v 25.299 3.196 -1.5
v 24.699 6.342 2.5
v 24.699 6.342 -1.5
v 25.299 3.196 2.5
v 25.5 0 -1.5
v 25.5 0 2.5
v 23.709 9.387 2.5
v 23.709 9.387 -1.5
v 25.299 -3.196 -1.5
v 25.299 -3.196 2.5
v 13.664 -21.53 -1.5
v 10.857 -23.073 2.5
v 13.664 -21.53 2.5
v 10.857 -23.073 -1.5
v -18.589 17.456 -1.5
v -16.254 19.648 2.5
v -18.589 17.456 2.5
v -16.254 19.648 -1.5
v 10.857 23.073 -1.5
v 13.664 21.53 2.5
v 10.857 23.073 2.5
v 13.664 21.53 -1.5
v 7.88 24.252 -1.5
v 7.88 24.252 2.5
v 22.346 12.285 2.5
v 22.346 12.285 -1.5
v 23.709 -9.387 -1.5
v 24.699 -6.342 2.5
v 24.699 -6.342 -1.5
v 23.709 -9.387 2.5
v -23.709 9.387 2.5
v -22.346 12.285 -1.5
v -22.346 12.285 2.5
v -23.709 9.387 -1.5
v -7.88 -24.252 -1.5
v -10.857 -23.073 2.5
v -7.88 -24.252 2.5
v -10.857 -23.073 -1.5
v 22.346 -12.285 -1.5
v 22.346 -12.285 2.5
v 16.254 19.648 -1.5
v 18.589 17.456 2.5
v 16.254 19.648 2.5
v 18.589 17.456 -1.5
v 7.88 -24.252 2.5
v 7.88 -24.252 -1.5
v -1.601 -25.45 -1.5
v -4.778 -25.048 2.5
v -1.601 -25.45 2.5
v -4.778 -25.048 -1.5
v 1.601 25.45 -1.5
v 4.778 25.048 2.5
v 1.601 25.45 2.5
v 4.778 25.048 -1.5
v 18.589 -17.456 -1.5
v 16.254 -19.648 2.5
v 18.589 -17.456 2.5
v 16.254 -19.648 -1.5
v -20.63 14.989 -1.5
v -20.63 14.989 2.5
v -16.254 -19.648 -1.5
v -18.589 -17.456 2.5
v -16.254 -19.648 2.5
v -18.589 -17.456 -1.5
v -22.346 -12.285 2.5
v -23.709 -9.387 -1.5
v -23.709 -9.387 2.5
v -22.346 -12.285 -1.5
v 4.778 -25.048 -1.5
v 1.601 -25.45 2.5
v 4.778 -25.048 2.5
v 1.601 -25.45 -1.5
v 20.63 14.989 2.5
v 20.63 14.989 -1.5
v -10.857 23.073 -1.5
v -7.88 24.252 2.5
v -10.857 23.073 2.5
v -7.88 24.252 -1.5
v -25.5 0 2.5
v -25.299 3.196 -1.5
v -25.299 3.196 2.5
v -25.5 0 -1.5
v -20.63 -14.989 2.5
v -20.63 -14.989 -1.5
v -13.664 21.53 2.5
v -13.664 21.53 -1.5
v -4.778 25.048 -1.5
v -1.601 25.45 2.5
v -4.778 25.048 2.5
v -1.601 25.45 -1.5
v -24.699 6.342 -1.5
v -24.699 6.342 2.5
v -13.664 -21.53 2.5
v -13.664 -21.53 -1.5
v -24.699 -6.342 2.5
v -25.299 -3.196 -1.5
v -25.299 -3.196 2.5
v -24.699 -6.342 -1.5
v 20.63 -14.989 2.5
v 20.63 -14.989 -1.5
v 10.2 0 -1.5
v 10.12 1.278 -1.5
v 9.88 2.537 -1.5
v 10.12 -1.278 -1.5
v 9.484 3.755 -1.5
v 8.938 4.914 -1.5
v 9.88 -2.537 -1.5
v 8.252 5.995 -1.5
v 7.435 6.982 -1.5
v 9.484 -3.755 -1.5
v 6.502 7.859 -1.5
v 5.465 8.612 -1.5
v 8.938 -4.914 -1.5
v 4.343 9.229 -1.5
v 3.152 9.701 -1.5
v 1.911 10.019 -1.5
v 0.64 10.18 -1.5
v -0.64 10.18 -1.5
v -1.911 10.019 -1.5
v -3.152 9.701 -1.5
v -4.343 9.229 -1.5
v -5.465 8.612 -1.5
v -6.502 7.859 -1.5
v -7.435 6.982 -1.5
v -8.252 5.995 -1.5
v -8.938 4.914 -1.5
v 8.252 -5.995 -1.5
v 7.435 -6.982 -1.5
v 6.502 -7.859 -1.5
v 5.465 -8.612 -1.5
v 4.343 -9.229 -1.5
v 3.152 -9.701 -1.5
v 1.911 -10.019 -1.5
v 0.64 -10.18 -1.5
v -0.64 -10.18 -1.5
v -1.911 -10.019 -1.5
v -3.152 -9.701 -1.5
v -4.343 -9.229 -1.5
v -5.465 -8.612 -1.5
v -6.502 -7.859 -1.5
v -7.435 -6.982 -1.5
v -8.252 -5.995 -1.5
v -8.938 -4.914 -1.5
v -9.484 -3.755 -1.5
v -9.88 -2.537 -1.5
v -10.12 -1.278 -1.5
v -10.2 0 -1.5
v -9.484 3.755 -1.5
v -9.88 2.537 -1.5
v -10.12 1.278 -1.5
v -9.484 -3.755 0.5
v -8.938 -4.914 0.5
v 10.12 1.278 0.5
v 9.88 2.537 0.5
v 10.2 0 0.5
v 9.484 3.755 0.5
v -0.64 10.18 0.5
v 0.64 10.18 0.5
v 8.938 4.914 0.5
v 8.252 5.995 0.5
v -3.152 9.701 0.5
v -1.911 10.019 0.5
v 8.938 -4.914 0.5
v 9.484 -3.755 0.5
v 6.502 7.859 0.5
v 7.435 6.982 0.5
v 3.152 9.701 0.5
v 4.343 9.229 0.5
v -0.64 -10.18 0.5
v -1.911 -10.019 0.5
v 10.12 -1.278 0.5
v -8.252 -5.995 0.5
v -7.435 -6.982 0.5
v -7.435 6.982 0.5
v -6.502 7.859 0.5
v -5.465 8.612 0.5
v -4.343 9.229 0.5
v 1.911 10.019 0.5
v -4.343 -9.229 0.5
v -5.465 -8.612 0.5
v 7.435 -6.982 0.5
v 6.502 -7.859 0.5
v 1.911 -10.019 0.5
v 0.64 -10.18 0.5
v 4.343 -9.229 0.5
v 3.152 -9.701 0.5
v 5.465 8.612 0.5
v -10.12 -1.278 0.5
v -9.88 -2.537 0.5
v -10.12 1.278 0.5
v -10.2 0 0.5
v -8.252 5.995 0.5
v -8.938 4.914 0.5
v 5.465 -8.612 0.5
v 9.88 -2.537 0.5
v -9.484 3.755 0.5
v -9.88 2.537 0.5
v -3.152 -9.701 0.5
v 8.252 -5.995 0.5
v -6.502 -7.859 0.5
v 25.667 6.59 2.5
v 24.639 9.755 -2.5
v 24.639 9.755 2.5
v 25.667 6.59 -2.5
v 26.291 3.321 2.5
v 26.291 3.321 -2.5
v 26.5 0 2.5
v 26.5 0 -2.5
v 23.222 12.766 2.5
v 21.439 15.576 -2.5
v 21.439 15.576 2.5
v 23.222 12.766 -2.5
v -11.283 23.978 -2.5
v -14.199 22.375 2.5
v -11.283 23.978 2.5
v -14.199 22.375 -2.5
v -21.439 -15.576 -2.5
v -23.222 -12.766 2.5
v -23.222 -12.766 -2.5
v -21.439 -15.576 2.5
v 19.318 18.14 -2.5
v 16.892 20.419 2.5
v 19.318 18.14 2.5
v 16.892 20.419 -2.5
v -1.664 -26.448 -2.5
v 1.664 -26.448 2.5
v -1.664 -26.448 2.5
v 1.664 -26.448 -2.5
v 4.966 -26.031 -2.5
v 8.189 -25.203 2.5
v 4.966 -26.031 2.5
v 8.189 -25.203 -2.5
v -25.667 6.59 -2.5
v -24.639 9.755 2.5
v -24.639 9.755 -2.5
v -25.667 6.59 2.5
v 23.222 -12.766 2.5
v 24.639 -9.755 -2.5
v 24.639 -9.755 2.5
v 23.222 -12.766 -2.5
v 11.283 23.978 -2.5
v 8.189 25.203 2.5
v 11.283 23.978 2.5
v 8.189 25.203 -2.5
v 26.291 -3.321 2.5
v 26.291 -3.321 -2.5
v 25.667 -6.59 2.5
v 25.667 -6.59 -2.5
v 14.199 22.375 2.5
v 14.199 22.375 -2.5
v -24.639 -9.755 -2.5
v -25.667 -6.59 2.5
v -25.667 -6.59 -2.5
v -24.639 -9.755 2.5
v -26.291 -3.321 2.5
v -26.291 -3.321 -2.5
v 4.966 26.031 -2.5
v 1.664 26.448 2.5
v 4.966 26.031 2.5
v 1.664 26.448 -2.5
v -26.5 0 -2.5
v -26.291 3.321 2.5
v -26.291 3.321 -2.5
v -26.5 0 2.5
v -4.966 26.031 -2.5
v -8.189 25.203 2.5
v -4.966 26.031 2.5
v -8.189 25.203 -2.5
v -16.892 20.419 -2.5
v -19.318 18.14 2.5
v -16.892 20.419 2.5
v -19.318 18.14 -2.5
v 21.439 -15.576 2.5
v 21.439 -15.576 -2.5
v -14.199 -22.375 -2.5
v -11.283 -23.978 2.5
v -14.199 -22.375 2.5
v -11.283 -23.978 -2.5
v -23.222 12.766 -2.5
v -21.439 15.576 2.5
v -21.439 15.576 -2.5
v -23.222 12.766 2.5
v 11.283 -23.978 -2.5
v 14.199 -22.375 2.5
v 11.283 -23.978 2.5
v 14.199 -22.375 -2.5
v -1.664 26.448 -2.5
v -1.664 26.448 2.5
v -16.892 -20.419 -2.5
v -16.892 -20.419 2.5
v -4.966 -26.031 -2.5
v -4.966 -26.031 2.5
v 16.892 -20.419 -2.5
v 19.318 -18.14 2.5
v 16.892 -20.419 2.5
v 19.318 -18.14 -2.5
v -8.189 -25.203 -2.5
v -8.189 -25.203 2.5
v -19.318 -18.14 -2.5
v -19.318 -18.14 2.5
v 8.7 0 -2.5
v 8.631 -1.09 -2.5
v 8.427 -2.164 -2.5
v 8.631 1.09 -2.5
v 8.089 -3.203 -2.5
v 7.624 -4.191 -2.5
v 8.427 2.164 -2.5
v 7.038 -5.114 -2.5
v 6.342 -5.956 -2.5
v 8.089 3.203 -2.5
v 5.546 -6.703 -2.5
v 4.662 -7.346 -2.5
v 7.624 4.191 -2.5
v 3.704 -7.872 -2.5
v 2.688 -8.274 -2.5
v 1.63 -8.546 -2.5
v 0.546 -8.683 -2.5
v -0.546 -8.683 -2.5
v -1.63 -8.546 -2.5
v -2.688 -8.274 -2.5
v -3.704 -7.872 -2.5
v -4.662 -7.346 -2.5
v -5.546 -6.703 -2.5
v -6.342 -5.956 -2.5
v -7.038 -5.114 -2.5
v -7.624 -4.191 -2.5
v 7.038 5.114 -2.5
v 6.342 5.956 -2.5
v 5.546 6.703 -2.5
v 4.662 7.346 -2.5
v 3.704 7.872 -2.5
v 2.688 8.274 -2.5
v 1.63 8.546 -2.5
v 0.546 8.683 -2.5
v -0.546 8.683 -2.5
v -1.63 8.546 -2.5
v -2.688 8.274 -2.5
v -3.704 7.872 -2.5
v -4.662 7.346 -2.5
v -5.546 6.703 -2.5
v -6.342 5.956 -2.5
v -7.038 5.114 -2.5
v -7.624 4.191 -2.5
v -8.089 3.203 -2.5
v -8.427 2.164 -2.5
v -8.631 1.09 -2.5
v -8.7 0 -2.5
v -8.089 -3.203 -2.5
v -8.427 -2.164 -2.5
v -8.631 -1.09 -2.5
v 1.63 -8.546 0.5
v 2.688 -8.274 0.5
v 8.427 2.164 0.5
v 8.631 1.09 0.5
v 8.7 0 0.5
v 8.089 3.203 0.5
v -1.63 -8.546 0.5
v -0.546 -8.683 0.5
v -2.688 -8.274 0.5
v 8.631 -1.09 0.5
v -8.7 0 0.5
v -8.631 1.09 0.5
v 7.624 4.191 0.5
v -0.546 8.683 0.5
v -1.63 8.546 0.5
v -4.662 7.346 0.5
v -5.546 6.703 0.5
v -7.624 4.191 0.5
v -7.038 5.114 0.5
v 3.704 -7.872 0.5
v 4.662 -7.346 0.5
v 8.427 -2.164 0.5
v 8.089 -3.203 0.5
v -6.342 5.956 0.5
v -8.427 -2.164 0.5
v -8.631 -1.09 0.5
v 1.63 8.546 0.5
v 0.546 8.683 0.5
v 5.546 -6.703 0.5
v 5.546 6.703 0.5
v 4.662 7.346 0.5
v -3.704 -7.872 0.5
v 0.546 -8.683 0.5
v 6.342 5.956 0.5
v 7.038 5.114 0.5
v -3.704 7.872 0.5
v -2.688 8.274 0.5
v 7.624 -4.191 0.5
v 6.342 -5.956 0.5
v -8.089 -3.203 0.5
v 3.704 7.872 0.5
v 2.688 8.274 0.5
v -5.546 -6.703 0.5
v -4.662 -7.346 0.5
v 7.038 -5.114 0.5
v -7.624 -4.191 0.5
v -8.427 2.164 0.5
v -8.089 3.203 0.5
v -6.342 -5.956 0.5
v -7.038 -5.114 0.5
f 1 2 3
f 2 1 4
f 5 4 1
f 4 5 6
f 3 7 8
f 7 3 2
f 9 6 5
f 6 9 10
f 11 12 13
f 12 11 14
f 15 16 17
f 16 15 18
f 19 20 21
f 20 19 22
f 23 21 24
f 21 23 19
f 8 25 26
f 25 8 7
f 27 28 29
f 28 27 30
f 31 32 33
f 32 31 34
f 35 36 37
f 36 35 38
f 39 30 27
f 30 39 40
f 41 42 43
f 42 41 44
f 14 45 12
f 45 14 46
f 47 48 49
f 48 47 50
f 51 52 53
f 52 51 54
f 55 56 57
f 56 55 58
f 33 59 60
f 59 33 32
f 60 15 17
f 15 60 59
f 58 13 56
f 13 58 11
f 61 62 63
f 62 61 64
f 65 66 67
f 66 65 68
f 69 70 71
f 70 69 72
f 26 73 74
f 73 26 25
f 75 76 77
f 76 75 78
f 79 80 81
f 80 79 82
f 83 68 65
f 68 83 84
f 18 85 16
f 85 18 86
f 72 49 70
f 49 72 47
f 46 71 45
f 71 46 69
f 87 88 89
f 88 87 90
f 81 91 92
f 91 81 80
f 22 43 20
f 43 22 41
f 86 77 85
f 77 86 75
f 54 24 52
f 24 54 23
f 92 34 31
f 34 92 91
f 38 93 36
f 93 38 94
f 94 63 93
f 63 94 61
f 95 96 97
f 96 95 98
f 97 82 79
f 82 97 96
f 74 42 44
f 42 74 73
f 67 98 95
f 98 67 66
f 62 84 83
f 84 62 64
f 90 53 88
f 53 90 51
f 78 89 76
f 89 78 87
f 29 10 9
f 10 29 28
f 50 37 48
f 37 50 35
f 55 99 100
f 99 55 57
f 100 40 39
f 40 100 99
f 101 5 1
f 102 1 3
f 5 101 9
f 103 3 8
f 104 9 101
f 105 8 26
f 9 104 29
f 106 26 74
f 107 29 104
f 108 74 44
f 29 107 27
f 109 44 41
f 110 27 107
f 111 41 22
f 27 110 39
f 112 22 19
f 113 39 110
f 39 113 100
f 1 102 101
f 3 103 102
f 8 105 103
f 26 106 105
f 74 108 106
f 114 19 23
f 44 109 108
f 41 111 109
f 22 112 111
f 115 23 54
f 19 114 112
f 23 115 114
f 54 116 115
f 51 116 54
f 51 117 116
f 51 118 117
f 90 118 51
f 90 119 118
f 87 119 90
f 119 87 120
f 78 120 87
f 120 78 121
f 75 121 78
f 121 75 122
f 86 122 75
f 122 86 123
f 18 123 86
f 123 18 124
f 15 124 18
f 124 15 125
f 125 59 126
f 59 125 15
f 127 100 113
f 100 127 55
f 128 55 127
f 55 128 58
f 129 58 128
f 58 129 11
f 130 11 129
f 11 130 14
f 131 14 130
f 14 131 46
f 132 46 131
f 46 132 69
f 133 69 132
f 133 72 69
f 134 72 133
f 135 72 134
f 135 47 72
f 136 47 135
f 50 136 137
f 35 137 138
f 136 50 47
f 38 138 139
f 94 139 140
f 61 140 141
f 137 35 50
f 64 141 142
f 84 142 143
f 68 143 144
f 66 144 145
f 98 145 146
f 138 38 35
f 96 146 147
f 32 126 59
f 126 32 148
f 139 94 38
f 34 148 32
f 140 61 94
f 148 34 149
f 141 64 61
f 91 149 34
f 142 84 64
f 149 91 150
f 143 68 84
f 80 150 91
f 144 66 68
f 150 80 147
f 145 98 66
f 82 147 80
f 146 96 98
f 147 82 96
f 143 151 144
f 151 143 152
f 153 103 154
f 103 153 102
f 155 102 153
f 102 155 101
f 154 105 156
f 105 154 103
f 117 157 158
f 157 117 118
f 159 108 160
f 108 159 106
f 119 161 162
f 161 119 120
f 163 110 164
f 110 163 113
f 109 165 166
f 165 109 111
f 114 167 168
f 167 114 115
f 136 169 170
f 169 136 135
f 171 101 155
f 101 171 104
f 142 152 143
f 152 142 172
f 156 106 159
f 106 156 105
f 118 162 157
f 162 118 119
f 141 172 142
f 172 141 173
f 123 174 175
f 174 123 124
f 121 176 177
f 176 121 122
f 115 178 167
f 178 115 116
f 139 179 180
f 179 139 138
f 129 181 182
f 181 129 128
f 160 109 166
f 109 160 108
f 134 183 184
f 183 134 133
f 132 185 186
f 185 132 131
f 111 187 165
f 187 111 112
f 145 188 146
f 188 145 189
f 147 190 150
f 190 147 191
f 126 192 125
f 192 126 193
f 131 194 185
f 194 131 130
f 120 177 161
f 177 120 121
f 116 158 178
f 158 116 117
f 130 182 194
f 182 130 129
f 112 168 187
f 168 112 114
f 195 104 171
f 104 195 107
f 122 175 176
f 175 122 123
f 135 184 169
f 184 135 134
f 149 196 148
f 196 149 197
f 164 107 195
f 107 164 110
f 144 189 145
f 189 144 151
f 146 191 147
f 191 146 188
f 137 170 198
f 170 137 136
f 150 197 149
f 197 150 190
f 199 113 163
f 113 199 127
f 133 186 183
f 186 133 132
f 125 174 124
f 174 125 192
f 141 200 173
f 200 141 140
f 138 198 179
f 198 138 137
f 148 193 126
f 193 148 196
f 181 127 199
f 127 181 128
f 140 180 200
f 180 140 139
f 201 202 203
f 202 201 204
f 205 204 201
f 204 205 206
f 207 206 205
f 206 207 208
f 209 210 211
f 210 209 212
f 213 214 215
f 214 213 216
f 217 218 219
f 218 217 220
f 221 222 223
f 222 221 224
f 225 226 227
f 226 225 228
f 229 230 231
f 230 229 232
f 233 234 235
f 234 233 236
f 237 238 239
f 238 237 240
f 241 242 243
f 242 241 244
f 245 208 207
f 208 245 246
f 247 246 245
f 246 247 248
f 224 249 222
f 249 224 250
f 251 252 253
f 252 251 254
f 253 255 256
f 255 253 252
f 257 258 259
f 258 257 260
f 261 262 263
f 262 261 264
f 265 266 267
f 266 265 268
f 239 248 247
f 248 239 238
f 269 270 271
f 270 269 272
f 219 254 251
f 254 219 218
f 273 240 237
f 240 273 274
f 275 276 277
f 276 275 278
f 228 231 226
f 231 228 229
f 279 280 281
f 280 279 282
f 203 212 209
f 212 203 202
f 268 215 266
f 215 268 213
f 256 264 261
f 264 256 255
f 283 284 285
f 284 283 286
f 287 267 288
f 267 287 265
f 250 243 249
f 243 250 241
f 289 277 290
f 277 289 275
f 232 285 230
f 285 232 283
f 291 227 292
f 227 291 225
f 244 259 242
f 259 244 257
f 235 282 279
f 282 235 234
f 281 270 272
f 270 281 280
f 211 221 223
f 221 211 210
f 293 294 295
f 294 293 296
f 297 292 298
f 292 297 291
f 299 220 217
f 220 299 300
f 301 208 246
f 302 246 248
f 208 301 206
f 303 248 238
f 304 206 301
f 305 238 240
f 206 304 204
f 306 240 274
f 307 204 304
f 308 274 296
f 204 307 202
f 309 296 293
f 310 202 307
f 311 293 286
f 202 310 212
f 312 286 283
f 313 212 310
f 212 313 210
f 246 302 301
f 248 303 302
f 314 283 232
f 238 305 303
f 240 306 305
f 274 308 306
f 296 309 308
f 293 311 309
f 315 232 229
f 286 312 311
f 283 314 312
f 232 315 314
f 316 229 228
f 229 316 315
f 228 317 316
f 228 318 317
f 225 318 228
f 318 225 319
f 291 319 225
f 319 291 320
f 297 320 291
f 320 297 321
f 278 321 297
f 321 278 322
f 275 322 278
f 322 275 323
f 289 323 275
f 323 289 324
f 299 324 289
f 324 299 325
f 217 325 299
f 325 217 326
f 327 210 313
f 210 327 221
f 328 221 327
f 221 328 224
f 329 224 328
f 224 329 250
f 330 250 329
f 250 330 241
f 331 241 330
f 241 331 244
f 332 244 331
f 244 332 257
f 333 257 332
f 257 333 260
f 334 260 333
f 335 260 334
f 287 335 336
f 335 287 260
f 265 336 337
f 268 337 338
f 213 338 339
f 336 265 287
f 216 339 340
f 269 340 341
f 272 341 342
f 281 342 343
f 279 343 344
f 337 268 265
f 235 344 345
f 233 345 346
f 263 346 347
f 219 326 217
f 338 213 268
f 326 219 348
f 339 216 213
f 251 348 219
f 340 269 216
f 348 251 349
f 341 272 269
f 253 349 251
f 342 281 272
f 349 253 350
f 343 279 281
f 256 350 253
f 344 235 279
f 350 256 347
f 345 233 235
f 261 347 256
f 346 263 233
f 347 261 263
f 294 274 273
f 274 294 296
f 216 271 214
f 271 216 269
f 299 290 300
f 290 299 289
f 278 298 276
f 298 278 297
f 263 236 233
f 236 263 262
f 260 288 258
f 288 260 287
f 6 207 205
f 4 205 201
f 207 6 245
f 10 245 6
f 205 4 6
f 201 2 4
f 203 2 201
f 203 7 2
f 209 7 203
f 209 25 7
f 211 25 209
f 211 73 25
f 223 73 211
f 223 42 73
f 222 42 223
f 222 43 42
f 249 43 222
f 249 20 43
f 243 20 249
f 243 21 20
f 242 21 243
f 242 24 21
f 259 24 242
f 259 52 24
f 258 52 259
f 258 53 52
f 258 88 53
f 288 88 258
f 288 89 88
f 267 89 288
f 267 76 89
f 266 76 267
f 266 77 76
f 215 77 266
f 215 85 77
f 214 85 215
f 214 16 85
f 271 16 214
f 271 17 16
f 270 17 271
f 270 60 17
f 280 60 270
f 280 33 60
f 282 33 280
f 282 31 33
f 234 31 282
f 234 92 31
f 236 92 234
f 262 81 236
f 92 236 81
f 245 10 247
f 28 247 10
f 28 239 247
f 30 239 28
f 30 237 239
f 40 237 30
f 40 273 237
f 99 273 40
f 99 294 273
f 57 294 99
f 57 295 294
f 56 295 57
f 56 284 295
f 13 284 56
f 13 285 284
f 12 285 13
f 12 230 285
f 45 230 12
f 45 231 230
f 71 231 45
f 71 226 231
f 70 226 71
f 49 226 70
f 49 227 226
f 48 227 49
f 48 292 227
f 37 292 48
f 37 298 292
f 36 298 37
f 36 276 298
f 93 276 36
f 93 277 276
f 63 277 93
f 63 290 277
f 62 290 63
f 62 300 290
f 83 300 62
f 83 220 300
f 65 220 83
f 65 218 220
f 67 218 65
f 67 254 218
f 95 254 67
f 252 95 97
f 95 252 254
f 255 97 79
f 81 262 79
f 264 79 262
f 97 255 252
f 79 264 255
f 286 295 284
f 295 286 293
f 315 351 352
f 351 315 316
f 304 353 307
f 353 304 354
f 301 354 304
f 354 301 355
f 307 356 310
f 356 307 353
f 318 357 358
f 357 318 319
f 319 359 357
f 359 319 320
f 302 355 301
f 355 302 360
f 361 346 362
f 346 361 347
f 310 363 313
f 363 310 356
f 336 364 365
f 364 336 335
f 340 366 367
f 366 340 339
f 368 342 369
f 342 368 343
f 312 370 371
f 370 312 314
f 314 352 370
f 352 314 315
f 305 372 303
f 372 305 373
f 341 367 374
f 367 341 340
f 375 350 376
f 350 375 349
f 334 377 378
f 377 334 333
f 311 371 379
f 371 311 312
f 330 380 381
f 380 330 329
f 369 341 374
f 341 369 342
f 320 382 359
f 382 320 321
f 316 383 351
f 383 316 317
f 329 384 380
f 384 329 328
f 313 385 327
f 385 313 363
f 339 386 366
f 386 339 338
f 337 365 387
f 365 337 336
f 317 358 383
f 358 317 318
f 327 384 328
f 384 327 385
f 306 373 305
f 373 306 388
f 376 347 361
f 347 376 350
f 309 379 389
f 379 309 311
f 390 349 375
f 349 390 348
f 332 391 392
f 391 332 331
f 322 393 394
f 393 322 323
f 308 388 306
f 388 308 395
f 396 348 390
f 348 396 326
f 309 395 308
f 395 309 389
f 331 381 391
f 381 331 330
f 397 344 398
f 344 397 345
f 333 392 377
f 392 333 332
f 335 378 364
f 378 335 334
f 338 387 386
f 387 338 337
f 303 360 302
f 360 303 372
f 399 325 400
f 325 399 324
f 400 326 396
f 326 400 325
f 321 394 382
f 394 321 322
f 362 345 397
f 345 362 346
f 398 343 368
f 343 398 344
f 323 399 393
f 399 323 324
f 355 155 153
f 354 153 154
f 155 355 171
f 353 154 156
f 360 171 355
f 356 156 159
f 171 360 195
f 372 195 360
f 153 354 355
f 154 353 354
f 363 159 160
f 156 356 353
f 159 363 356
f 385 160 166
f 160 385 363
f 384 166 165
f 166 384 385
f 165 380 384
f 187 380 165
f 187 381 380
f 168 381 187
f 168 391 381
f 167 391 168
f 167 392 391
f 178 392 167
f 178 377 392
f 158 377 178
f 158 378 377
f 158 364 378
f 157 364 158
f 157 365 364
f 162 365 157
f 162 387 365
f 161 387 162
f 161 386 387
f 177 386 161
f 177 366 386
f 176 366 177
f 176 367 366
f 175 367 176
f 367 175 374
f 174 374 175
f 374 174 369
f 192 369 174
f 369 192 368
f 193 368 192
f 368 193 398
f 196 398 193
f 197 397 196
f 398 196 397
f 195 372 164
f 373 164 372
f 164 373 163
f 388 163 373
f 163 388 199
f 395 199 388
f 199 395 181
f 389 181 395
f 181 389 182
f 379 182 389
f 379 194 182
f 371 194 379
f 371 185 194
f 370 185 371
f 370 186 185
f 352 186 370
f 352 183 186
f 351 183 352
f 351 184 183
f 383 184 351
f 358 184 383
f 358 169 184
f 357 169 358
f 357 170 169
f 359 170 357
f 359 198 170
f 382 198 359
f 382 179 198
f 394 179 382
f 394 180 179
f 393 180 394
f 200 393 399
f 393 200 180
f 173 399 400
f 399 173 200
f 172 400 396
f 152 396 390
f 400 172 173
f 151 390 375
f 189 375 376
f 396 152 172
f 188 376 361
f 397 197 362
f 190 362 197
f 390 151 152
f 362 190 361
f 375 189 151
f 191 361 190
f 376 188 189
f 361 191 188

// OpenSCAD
/* Open SCAD Name.: lens_adapter_v1.scad
*  Copyright (c)..: 2017 www.DIY3DTech.com
*
*  Creation Date..: 
*  Description....: 
*
*  Rev 1: Develop Model
*  Rev 2: 
*
*  This program is free software; you can redistribute it and/or modify
*  it under the terms of the GNU General Public License as published by
*  the Free Software Foundation; either version 2 of the License, or
*  (at your option) any later version.
*
*  This program is distributed in the hope that it will be useful,
*  but WITHOUT ANY WARRANTY; without even the implied warranty of
*  MERCHANTABILITY or FITNESS FOR A PARTICULAR PURPOSE.  See the
*  GNU General Public License for more details.
*/ 

/*------------------Customizer View-------------------*/

// preview[view:north, tilt:top]

/*---------------------Parameters---------------------*/

//outer dia of filter retainer in mm (about 2mm larger then filter threads)
ring_od         =   53;     //[25:1:100]

//how tall should we make the retaining ring in mm (7 to 100mm should work)
ring_tall       =    7;     //[5:1:10]

//outer dia of filter threads in mm (note threads not filter)
filter_od       =   51;     //[25:1:73]

//outer dia of action camera lens in mm
cam_lens_od     =   17.4;   //[15:0.1:25]

/*-----------------------Execute----------------------*/

main_module();

/*-----------------------Modules----------------------*/

module main_module(){ //create module
    difference() {
            union() {//start union
                
                //create retaining body
                translate ([0,0,0]) rotate ([0,0,0]) cylinder(5,ring_od/2,ring_od/2,$fn=50,true);
                  
                    } //end union
                            
    //start subtraction of difference
                //knock out donut shape to provide room for filter
                translate ([0,0,2]) rotate ([0,0,0]) donut_module(ring_tall,filter_od,cam_lens_od+3);
                //knock out center hole for action camera lens
                translate ([0,0,0]) rotate ([0,0,0]) cylinder(ring_tall*2,cam_lens_od/2,cam_lens_od/2,$fn=50,true);
                //recess center opening to clear filter
                translate ([0,0,4]) rotate ([0,0,0]) cylinder(ring_tall,(cam_lens_od/2)+2,(cam_lens_od/2)+2,$fn=50,true);
                                               
    } //end difference
}//end module

module donut_module(tall,od,id){ //create module
    difference() {
            union() {//start union
                
                //create outer body
                translate ([0,0,0]) rotate ([0,0,0]) cylinder(tall,od/2,od/2,$fn=50,true);
                    } //end union
                            
    //start subtraction of difference
                //create hole
                translate ([0,0,0]) rotate ([0,0,0]) cylinder(tall+2,id/2,id/2,$fn=50,true);
                                               
    } //end difference
}//end module
                 
/*----------------------End Code----------------------*/
//translate ([0,0,0]) rotate ([0,0,0]) cylinder(5,3,3,true);
//translate ([0,0,0]) rotate ([0,0,0]) cube([18,18,18],true);
//translate ([0,0,0]) sphere($fn = 0, $fa = 12, $fs = 2, r = 1);
//translate ([0,0,0]) rotate ([0,0,0]) rounded (15,15,1,1,true);
